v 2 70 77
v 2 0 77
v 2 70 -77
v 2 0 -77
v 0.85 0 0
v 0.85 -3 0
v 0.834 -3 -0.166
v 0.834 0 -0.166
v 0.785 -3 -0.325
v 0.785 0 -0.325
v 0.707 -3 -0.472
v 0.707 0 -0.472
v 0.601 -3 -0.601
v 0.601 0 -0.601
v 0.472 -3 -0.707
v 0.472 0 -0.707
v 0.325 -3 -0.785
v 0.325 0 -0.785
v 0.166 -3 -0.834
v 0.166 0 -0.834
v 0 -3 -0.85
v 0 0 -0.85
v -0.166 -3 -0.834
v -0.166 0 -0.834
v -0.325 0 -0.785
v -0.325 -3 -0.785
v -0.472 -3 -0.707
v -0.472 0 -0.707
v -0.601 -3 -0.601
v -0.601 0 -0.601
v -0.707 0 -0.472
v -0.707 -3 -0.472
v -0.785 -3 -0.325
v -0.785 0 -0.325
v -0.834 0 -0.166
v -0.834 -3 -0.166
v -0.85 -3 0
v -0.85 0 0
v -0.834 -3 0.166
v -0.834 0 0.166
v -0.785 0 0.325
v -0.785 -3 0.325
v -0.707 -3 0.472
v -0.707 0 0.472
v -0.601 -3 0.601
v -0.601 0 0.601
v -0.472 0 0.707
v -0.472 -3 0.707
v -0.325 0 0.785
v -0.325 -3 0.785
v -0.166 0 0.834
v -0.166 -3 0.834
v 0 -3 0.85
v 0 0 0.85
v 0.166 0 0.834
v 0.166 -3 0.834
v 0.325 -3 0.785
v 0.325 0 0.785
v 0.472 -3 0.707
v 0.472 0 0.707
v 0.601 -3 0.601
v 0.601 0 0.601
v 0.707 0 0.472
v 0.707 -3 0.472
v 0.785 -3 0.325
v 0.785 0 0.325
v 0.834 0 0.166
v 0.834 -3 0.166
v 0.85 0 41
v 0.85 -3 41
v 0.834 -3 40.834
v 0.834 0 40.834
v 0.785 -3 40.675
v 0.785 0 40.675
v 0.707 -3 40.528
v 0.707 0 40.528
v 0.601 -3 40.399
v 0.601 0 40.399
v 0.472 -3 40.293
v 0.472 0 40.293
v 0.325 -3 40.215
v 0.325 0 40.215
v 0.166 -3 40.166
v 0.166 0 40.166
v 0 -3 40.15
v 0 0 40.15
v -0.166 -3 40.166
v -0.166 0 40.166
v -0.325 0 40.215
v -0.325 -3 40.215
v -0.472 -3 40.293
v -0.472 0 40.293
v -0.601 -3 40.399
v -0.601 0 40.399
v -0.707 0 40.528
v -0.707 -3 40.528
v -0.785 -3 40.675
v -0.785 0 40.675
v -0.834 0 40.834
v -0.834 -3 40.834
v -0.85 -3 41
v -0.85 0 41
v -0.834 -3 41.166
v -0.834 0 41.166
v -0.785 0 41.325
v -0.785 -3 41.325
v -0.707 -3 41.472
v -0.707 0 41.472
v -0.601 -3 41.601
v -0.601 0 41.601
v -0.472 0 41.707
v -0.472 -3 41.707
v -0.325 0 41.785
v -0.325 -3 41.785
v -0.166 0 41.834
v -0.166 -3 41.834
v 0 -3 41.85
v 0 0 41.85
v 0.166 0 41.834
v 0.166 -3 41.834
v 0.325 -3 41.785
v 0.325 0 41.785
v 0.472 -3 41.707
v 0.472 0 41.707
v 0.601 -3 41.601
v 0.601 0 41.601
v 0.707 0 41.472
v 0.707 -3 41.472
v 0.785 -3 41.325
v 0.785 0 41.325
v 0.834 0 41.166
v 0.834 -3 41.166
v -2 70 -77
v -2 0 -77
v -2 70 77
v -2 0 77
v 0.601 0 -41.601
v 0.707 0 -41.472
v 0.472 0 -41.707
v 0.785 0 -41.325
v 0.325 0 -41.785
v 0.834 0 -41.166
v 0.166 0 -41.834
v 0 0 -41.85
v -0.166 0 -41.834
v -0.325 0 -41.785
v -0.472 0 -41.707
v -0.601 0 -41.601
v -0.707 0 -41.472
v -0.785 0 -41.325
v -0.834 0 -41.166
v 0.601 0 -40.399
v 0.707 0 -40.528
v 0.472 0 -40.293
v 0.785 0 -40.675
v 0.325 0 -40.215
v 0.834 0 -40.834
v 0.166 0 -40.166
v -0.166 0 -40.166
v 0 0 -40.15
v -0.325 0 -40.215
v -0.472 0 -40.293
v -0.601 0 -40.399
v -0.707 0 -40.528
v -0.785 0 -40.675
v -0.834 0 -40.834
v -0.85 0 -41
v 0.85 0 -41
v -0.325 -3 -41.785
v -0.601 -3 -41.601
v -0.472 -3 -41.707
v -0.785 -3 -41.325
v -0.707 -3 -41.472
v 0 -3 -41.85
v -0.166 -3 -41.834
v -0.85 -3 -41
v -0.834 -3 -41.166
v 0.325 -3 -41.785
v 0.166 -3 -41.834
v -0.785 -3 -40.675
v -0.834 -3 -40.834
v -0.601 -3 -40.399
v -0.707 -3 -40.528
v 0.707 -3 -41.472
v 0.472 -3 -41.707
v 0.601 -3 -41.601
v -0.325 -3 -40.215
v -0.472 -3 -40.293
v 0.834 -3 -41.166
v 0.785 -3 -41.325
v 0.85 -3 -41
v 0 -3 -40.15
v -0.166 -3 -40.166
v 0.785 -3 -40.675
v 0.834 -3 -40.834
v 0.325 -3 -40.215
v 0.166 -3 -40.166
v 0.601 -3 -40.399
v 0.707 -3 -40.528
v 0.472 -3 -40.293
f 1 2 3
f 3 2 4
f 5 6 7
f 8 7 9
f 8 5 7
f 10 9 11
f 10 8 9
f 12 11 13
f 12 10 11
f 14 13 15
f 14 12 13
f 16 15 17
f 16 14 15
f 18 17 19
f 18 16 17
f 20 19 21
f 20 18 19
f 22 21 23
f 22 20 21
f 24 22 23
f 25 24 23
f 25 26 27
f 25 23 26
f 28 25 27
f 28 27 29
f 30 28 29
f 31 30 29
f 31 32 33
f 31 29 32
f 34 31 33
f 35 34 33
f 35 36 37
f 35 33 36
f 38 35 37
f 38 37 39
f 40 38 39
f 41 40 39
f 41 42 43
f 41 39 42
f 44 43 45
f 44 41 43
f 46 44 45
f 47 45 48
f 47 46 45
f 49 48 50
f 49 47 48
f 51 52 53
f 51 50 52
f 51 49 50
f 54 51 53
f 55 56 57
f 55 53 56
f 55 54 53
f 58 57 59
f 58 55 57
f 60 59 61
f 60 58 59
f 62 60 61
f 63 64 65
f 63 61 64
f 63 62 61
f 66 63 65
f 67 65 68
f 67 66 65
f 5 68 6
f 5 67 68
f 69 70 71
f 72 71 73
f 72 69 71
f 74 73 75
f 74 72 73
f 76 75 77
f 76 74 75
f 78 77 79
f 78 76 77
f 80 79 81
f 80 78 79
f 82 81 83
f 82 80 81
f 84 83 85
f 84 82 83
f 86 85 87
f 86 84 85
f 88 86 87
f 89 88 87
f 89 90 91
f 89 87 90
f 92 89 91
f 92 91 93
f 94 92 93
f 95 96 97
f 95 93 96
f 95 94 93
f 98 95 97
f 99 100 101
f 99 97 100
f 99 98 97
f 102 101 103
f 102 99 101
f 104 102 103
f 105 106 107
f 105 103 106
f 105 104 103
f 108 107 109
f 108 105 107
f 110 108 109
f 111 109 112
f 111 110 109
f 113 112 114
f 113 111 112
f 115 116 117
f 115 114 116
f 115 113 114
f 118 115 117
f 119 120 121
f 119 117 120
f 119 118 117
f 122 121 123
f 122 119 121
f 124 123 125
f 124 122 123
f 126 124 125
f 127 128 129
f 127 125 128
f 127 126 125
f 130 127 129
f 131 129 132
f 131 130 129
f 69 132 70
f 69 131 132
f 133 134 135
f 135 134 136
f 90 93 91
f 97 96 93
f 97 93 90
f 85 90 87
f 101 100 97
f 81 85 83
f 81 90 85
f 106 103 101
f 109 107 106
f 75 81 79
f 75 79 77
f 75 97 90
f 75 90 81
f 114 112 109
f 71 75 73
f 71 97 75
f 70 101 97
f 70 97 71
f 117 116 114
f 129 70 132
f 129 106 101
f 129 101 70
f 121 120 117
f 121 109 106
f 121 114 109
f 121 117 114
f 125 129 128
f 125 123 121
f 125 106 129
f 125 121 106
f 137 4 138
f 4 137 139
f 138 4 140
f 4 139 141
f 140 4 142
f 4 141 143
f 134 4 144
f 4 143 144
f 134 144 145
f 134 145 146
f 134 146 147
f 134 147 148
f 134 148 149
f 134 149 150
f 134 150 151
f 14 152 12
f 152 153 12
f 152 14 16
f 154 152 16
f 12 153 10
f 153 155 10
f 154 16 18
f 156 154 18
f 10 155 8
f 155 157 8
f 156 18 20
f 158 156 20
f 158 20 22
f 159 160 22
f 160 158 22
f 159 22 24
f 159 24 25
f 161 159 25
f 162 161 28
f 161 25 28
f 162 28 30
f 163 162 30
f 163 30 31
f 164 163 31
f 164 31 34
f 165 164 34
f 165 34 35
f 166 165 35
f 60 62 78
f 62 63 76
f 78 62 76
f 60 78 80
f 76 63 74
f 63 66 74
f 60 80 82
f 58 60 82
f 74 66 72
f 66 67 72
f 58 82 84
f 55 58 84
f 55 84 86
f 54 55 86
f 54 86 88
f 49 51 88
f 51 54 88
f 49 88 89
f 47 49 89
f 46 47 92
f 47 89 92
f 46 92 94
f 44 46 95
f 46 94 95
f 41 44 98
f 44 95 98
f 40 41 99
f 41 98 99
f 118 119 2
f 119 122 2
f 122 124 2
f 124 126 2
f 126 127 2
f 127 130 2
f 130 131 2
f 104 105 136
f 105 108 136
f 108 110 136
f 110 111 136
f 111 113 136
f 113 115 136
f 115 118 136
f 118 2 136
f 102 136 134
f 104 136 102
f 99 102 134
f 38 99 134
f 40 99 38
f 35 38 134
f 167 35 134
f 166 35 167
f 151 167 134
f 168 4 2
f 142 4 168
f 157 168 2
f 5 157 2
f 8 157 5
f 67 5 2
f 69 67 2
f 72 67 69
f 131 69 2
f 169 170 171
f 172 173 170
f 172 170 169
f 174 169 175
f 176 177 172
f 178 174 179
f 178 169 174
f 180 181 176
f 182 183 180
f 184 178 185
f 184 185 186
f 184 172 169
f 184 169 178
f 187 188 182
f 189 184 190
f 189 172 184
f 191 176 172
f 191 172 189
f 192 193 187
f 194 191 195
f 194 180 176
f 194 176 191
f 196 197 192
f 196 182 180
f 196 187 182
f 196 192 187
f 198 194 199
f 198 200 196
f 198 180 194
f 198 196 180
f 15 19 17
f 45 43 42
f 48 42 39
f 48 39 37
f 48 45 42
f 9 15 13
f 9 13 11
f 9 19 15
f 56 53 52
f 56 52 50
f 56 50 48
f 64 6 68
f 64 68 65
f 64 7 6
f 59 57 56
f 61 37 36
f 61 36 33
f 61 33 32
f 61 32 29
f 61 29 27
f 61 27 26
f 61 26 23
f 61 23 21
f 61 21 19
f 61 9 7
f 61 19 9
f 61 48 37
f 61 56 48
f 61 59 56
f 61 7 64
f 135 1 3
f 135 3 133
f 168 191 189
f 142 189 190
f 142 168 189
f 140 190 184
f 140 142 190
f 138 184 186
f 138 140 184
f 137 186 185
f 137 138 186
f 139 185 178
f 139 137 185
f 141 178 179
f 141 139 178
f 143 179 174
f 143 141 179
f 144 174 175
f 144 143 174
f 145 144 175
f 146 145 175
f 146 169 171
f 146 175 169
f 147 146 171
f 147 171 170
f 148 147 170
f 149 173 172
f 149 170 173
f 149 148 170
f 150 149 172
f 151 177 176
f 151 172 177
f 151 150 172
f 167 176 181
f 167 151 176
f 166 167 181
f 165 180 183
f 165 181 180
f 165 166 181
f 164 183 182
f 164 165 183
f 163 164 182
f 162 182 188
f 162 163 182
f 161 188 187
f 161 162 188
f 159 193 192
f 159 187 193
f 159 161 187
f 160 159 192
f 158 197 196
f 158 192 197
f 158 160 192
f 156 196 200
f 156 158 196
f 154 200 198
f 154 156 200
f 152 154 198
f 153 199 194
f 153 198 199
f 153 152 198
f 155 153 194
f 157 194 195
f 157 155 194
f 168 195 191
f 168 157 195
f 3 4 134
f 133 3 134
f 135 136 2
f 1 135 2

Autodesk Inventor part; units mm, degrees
ref_plane "YZ Plane" through (0, 0, 0) normal (1, 0, 0) x (0, 1, 0)
ref_plane "XZ Plane" through (0, 0, 0) normal (0, 1, 0) x (-1, 0, 0)
ref_plane "XY Plane" through (0, 0, 0) normal (0, 0, 1) x (1, 0, 0)
sketch "Sketch1" plane through (0, 0, 0) normal (0, 1, 0) x (-1, 0, 0)
  line L0 (2, 77) -> (-2, 77)
  line L1 (-2, 77) -> (-2, -77)
  line L2 (-2, -77) -> (2, -77)
  line L3 (2, -77) -> (2, 77)
  line L4 (2, 77) -> (-2, -77) construction
  line L5 (-2, 77) -> (2, -77) construction
  circle A0 centre (0, -41) radius 0.85
  circle A1 centre (0, 0) radius 0.85
  circle A2 centre (0, 41) radius 0.85
  point P0 (0, 0)
  dimension "d0" = 154
  dimension "d1" = 4
  dimension "d2" = 1.7
  dimension "d3" = 2
  dimension "d4" = 36
  dimension "d5" = 1.7
  dimension "d6" = 2
  dimension "d8" = 77
  dimension "d9" = 1.7
  dimension "d10" = 2
  dimension "d11" = 118
extrude "MainBody" add sketch "Sketch1" along normal blind 70
sketch "Sketch2" plane through (0, 0, 0) normal (0, -1, 0) x (1, 0, 0)
  circle A0 centre (0, 0) radius 0.85
extrude "MiddlePole" add sketch "Sketch2" along normal blind 3 and the other way blind 70
sketch "Sketch3" plane through (0, 0, 0) normal (0, -1, 0) x (1, 0, 0)
  circle A0 centre (0, 41) radius 0.85 projected
  circle A1 centre (0, 41) radius 0.85
  point P0 (0, 0)
extrude "UpperPole" add sketch "Sketch3" along normal blind 3 and the other way blind 70
sketch "Sketch4" plane through (0, 0, 0) normal (0, -1, 0) x (1, 0, 0)
  circle A0 centre (0, -41) radius 0.85
  point P0 (0, 0)
extrude "LowerPole" add sketch "Sketch4" along normal blind 3 and the other way blind 70
properties part number "DindingKargoKananKiri"
